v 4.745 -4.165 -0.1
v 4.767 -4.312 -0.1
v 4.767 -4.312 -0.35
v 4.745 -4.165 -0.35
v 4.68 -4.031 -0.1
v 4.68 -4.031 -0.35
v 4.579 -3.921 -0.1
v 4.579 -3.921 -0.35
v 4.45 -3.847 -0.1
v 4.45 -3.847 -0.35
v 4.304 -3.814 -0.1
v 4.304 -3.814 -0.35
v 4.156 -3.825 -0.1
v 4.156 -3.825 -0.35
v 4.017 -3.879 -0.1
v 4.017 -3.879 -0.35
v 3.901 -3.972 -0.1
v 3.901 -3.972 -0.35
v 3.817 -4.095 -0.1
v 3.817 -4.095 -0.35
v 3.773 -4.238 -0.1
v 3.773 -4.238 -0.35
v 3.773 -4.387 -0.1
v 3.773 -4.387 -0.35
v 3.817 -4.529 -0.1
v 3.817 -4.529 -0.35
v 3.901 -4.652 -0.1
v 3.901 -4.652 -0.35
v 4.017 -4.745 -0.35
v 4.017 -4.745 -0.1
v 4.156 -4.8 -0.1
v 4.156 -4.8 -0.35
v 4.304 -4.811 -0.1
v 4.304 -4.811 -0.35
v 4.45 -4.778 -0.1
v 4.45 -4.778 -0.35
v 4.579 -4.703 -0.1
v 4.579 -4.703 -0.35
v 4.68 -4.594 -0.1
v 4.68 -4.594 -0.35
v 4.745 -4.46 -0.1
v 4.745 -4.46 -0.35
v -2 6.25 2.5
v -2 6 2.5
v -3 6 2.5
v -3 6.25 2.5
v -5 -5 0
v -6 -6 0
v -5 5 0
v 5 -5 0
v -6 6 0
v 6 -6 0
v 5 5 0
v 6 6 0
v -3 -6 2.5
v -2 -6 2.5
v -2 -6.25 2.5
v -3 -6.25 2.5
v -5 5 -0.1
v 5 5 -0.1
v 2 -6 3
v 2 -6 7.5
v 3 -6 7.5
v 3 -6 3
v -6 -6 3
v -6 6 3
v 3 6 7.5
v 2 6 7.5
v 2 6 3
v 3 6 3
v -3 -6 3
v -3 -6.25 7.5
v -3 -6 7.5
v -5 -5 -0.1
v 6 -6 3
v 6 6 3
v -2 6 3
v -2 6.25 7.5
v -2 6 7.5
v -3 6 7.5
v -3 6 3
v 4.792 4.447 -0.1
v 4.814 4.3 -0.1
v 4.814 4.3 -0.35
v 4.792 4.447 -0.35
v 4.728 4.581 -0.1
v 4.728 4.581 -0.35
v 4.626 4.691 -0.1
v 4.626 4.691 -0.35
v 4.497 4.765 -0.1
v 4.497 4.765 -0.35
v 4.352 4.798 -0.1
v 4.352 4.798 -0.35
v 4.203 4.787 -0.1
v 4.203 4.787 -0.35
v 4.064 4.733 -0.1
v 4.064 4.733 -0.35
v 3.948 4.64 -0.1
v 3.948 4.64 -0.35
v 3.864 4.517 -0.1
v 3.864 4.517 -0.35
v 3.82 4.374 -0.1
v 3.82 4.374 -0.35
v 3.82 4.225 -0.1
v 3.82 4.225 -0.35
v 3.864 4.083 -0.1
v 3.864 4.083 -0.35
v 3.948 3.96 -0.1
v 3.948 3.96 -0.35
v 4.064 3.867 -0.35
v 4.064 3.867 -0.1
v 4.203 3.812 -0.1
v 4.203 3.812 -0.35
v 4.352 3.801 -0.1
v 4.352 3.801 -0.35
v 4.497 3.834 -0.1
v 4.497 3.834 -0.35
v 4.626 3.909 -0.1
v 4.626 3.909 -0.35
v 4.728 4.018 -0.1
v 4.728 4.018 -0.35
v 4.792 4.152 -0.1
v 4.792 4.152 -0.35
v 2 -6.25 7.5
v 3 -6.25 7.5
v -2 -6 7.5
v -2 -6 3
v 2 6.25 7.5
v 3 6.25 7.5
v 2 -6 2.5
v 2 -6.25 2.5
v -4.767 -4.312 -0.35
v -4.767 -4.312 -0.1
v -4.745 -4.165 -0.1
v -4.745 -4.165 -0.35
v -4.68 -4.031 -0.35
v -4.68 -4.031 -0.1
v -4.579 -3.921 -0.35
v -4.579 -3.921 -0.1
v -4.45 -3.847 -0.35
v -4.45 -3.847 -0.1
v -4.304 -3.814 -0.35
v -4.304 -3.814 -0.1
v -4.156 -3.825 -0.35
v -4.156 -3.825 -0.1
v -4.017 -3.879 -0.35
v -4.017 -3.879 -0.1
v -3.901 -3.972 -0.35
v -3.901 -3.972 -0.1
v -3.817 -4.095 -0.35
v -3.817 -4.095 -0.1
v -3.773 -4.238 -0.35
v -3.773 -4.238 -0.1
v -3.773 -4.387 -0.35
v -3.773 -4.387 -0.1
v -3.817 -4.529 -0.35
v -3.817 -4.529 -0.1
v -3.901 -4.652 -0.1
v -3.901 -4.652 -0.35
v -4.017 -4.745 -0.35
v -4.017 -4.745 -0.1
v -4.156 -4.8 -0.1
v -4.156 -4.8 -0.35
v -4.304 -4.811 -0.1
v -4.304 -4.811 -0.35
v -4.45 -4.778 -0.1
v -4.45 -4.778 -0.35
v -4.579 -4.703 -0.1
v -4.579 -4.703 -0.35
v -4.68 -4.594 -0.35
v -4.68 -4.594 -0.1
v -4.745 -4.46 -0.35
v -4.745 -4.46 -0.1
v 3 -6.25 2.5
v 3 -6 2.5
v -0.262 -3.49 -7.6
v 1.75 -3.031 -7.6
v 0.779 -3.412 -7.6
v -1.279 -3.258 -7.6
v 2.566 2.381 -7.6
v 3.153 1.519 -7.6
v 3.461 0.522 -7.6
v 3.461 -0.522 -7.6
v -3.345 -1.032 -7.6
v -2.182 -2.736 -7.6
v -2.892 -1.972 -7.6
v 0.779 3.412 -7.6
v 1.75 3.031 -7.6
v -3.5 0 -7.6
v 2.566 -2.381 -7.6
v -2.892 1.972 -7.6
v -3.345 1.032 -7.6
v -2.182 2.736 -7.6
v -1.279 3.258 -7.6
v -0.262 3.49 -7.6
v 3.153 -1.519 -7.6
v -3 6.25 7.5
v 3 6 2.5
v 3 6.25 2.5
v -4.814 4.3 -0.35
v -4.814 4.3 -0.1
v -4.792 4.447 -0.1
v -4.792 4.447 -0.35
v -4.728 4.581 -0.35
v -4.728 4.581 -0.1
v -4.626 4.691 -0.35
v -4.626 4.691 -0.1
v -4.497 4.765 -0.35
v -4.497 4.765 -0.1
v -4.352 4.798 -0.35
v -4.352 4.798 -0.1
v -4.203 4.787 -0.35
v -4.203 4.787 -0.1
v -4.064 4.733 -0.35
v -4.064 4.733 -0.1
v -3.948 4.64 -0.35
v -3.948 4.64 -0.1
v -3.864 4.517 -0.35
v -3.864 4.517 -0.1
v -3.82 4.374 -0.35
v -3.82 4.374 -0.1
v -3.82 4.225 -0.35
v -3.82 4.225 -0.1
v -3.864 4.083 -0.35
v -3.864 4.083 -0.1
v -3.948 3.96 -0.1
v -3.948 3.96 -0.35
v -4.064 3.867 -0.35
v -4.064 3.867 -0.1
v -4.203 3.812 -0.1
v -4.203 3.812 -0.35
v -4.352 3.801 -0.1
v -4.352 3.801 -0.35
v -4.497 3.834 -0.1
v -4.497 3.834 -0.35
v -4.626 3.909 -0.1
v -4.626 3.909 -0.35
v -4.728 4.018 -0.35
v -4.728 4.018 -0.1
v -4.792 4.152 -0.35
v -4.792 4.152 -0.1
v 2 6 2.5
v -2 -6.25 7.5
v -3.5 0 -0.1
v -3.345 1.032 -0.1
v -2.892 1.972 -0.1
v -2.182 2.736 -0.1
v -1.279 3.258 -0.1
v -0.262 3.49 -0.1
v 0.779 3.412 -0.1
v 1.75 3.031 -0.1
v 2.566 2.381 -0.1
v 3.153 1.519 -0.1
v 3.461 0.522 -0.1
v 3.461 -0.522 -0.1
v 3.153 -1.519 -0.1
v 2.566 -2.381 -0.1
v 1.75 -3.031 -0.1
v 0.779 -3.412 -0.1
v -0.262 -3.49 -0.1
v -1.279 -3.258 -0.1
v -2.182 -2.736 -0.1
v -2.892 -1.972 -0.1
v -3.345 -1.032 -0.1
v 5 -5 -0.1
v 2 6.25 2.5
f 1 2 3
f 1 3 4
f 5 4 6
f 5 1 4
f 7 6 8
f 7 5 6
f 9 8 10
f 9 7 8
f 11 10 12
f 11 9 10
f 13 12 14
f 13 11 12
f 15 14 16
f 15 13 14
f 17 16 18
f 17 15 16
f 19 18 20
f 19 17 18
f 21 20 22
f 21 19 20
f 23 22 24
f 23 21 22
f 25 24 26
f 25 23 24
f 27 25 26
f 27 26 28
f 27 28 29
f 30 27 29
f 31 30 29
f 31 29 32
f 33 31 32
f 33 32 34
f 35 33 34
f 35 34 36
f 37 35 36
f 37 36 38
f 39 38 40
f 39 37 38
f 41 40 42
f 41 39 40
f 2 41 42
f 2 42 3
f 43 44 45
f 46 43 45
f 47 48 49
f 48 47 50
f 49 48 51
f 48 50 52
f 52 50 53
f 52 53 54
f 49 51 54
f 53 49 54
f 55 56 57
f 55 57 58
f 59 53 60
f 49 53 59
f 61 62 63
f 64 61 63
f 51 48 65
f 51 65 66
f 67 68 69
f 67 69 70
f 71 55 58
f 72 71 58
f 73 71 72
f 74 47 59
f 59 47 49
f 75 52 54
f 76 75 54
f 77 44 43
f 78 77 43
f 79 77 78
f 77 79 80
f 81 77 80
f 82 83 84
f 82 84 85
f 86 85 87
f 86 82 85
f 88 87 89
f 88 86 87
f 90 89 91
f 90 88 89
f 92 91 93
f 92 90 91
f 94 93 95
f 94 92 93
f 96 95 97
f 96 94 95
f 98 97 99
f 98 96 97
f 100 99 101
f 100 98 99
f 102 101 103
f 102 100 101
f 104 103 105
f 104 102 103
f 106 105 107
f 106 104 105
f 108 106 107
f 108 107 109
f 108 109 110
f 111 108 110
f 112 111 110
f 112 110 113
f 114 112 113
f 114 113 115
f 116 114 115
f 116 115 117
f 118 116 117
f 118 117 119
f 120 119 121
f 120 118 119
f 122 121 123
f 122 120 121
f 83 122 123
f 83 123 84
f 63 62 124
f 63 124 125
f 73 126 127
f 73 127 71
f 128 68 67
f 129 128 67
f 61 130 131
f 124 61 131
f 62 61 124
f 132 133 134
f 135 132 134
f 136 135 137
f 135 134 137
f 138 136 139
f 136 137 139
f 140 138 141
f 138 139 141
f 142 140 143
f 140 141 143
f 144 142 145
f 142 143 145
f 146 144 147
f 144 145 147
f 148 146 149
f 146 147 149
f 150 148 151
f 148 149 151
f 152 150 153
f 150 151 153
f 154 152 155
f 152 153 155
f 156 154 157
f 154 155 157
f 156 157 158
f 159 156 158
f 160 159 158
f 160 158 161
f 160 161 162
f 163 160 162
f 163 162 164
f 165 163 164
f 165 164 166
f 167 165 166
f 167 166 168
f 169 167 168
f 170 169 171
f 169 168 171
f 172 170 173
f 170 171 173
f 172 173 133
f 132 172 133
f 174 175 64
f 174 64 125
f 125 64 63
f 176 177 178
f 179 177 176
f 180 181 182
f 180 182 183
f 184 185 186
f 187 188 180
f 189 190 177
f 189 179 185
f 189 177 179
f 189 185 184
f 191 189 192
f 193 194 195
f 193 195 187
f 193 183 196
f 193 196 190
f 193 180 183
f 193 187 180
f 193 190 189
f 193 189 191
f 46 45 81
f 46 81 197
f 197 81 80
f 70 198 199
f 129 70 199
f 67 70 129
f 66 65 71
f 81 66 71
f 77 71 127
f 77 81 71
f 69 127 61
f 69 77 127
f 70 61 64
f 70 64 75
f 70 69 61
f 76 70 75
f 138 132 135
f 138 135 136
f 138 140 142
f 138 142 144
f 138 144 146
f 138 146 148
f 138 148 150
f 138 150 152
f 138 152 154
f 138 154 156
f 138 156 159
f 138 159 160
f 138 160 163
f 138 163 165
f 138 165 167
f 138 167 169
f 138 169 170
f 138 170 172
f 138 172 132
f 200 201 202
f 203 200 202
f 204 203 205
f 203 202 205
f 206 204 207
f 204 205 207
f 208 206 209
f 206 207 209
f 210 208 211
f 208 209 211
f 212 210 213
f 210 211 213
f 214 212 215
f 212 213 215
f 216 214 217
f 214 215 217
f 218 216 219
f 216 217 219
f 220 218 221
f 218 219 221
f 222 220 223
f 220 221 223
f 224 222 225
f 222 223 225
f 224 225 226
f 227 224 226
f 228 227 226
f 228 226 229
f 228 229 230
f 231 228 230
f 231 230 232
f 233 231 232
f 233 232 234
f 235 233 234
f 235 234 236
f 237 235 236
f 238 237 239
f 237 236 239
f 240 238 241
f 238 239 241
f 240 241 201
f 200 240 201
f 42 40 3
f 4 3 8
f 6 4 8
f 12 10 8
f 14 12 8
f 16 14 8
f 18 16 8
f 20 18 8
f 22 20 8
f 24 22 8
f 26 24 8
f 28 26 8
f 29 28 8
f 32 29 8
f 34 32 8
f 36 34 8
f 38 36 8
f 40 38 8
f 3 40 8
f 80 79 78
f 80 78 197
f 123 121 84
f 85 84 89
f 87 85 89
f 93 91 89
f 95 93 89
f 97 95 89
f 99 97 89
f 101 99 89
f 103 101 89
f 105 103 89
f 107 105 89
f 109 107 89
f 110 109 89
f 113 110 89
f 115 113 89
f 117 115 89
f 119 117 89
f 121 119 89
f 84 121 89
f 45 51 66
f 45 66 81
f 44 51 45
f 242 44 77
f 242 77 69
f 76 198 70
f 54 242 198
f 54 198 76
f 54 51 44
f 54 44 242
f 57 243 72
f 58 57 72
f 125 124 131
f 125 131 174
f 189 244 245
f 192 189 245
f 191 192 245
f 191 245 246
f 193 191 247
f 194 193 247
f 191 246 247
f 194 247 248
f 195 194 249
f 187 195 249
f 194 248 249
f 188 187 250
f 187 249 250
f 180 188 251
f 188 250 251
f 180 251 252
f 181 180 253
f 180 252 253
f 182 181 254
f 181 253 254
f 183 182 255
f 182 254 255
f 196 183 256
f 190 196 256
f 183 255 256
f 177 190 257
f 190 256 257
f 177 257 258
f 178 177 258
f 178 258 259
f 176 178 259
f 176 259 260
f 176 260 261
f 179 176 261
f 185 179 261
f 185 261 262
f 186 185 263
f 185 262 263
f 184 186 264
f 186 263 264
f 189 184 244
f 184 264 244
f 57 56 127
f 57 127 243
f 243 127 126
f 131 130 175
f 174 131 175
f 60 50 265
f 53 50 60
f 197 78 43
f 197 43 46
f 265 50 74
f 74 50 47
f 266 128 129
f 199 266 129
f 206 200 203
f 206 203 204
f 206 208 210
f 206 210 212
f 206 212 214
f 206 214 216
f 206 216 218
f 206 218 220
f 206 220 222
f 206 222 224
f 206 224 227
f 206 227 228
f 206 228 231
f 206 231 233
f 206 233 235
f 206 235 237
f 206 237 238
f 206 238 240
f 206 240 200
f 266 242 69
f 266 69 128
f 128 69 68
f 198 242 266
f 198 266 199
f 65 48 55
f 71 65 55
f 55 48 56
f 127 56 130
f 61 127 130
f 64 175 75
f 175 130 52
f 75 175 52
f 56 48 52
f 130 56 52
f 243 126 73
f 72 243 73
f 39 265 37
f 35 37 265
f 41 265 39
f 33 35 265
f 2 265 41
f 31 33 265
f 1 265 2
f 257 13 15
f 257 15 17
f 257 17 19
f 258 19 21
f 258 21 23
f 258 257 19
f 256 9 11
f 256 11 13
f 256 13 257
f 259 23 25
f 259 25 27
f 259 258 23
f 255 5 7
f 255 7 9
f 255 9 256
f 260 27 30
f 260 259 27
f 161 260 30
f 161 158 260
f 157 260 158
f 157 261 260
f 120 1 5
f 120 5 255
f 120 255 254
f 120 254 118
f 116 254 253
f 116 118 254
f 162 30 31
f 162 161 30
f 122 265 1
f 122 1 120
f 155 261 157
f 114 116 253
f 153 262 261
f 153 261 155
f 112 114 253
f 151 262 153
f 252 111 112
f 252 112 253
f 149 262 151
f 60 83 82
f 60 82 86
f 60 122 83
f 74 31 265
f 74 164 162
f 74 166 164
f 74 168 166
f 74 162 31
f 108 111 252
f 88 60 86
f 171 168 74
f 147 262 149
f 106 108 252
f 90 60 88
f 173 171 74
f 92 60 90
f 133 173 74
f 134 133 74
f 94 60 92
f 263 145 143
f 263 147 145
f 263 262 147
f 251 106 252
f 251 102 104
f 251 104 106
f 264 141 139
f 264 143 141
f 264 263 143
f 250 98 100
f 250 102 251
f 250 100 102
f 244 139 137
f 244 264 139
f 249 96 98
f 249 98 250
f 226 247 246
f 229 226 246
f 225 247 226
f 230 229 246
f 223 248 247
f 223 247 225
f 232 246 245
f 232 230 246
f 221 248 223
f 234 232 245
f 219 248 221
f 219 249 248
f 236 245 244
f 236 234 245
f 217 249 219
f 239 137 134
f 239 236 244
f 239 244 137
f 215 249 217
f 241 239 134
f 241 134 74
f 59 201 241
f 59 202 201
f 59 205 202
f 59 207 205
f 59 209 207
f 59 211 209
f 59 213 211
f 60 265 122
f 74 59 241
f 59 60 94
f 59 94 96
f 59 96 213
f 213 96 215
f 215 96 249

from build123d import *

# Parameters (mm, degrees)
SKETCH1_W               = 12
SKETCH1_H               = 12
BOSS_EXTRUDE1_DEPTH     = 3
SKETCH4_W               = 10
SKETCH4_H               = 10
BOSS_EXTRUDE2_DEPTH     = 0.1
SKETCH5_R               = 0.5
BOSS_EXTRUDE3_DEPTH     = 0.25
SKETCH7_R               = 0.5
BOSS_EXTRUDE4_DEPTH     = 0.25
SKETCH9_R               = 3.5
BOSS_EXTRUDE5_DEPTH     = 7.5
SKETCH10_W              = 1
SKETCH10_H              = 5
BOSS_EXTRUDE6_DEPTH     = 0.25
MIRROR3_COPY_1_SKETCH_W = 1
MIRROR3_COPY_1_SKETCH_H = 5
MIRROR3_COPY_1_DEPTH    = 0.25


with BuildPart() as part:
    # Sketch1 → Boss-Extrude1 (new body)
    with BuildSketch(Plane.XY):
        Rectangle(SKETCH1_W, SKETCH1_H)
    extrude(amount=BOSS_EXTRUDE1_DEPTH)

    # Sketch4 → Boss-Extrude2 (add)
    with BuildSketch(Plane(origin=(0, 0, 0), x_dir=(-1, 0, 0), z_dir=(0, 0, -1))):
        Rectangle(SKETCH4_W, SKETCH4_H)
    extrude(amount=BOSS_EXTRUDE2_DEPTH)

    # Sketch5 → Boss-Extrude3 (add)
    with BuildSketch(Plane(origin=(0, 0, -0.1), x_dir=(-1, 0, 0), z_dir=(0, 0, -1))):
        with Locations((4.314401818, 4.299659248)):
            Circle(SKETCH5_R)
    boss_extrude3 = extrude(amount=BOSS_EXTRUDE3_DEPTH)

    # Sketch7 → Boss-Extrude4 (add)
    with BuildSketch(Plane(origin=(-0.182739642, -0.928429526, -0.1), x_dir=(-1, 0, 0), z_dir=(0, 0, -1))):
        with Locations((4.084292385, -3.383848304)):
            Circle(SKETCH7_R)
    boss_extrude4 = extrude(amount=BOSS_EXTRUDE4_DEPTH)

    # Mirror1: Boss-Extrude3, Boss-Extrude4 across plane
    add(boss_extrude3.mirror(Plane(origin=(0, 0, 0), x_dir=(0, 0, 1), z_dir=(1, 0, 0))))
    add(boss_extrude4.mirror(Plane(origin=(0, 0, 0), x_dir=(0, 0, 1), z_dir=(1, 0, 0))))

    # Sketch9 → Boss-Extrude5 (add)
    with BuildSketch(Plane(origin=(0, 0, -0.1), x_dir=(-1, 0, 0), z_dir=(0, 0, -1))):
        Circle(SKETCH9_R)
    extrude(amount=BOSS_EXTRUDE5_DEPTH)

    # Sketch10 → Boss-Extrude6 (add)
    with BuildSketch(Plane.XZ.offset(6)):
        with Locations((2.5, 5)):
            Rectangle(SKETCH10_W, SKETCH10_H)
    boss_extrude6 = extrude(amount=BOSS_EXTRUDE6_DEPTH)

    # Mirror2: Boss-Extrude6 across plane
    add(boss_extrude6.mirror(Plane(origin=(0, 0, 0), x_dir=(0, 0, 1), z_dir=(1, 0, 0))))

    # Mirror3: Boss-Extrude6 across plane
    add(boss_extrude6.mirror(Plane.ZX))

    # Mirror3 copy 1 sketch → Mirror3 copy 1 (add)
    with BuildSketch(Plane(origin=(0, 6, 0), x_dir=(-1, 0, 0), z_dir=(0, 1, 0))):
        with Locations((2.5, 5)):
            Rectangle(MIRROR3_COPY_1_SKETCH_W, MIRROR3_COPY_1_SKETCH_H)
    extrude(amount=MIRROR3_COPY_1_DEPTH)


solid = part.part
